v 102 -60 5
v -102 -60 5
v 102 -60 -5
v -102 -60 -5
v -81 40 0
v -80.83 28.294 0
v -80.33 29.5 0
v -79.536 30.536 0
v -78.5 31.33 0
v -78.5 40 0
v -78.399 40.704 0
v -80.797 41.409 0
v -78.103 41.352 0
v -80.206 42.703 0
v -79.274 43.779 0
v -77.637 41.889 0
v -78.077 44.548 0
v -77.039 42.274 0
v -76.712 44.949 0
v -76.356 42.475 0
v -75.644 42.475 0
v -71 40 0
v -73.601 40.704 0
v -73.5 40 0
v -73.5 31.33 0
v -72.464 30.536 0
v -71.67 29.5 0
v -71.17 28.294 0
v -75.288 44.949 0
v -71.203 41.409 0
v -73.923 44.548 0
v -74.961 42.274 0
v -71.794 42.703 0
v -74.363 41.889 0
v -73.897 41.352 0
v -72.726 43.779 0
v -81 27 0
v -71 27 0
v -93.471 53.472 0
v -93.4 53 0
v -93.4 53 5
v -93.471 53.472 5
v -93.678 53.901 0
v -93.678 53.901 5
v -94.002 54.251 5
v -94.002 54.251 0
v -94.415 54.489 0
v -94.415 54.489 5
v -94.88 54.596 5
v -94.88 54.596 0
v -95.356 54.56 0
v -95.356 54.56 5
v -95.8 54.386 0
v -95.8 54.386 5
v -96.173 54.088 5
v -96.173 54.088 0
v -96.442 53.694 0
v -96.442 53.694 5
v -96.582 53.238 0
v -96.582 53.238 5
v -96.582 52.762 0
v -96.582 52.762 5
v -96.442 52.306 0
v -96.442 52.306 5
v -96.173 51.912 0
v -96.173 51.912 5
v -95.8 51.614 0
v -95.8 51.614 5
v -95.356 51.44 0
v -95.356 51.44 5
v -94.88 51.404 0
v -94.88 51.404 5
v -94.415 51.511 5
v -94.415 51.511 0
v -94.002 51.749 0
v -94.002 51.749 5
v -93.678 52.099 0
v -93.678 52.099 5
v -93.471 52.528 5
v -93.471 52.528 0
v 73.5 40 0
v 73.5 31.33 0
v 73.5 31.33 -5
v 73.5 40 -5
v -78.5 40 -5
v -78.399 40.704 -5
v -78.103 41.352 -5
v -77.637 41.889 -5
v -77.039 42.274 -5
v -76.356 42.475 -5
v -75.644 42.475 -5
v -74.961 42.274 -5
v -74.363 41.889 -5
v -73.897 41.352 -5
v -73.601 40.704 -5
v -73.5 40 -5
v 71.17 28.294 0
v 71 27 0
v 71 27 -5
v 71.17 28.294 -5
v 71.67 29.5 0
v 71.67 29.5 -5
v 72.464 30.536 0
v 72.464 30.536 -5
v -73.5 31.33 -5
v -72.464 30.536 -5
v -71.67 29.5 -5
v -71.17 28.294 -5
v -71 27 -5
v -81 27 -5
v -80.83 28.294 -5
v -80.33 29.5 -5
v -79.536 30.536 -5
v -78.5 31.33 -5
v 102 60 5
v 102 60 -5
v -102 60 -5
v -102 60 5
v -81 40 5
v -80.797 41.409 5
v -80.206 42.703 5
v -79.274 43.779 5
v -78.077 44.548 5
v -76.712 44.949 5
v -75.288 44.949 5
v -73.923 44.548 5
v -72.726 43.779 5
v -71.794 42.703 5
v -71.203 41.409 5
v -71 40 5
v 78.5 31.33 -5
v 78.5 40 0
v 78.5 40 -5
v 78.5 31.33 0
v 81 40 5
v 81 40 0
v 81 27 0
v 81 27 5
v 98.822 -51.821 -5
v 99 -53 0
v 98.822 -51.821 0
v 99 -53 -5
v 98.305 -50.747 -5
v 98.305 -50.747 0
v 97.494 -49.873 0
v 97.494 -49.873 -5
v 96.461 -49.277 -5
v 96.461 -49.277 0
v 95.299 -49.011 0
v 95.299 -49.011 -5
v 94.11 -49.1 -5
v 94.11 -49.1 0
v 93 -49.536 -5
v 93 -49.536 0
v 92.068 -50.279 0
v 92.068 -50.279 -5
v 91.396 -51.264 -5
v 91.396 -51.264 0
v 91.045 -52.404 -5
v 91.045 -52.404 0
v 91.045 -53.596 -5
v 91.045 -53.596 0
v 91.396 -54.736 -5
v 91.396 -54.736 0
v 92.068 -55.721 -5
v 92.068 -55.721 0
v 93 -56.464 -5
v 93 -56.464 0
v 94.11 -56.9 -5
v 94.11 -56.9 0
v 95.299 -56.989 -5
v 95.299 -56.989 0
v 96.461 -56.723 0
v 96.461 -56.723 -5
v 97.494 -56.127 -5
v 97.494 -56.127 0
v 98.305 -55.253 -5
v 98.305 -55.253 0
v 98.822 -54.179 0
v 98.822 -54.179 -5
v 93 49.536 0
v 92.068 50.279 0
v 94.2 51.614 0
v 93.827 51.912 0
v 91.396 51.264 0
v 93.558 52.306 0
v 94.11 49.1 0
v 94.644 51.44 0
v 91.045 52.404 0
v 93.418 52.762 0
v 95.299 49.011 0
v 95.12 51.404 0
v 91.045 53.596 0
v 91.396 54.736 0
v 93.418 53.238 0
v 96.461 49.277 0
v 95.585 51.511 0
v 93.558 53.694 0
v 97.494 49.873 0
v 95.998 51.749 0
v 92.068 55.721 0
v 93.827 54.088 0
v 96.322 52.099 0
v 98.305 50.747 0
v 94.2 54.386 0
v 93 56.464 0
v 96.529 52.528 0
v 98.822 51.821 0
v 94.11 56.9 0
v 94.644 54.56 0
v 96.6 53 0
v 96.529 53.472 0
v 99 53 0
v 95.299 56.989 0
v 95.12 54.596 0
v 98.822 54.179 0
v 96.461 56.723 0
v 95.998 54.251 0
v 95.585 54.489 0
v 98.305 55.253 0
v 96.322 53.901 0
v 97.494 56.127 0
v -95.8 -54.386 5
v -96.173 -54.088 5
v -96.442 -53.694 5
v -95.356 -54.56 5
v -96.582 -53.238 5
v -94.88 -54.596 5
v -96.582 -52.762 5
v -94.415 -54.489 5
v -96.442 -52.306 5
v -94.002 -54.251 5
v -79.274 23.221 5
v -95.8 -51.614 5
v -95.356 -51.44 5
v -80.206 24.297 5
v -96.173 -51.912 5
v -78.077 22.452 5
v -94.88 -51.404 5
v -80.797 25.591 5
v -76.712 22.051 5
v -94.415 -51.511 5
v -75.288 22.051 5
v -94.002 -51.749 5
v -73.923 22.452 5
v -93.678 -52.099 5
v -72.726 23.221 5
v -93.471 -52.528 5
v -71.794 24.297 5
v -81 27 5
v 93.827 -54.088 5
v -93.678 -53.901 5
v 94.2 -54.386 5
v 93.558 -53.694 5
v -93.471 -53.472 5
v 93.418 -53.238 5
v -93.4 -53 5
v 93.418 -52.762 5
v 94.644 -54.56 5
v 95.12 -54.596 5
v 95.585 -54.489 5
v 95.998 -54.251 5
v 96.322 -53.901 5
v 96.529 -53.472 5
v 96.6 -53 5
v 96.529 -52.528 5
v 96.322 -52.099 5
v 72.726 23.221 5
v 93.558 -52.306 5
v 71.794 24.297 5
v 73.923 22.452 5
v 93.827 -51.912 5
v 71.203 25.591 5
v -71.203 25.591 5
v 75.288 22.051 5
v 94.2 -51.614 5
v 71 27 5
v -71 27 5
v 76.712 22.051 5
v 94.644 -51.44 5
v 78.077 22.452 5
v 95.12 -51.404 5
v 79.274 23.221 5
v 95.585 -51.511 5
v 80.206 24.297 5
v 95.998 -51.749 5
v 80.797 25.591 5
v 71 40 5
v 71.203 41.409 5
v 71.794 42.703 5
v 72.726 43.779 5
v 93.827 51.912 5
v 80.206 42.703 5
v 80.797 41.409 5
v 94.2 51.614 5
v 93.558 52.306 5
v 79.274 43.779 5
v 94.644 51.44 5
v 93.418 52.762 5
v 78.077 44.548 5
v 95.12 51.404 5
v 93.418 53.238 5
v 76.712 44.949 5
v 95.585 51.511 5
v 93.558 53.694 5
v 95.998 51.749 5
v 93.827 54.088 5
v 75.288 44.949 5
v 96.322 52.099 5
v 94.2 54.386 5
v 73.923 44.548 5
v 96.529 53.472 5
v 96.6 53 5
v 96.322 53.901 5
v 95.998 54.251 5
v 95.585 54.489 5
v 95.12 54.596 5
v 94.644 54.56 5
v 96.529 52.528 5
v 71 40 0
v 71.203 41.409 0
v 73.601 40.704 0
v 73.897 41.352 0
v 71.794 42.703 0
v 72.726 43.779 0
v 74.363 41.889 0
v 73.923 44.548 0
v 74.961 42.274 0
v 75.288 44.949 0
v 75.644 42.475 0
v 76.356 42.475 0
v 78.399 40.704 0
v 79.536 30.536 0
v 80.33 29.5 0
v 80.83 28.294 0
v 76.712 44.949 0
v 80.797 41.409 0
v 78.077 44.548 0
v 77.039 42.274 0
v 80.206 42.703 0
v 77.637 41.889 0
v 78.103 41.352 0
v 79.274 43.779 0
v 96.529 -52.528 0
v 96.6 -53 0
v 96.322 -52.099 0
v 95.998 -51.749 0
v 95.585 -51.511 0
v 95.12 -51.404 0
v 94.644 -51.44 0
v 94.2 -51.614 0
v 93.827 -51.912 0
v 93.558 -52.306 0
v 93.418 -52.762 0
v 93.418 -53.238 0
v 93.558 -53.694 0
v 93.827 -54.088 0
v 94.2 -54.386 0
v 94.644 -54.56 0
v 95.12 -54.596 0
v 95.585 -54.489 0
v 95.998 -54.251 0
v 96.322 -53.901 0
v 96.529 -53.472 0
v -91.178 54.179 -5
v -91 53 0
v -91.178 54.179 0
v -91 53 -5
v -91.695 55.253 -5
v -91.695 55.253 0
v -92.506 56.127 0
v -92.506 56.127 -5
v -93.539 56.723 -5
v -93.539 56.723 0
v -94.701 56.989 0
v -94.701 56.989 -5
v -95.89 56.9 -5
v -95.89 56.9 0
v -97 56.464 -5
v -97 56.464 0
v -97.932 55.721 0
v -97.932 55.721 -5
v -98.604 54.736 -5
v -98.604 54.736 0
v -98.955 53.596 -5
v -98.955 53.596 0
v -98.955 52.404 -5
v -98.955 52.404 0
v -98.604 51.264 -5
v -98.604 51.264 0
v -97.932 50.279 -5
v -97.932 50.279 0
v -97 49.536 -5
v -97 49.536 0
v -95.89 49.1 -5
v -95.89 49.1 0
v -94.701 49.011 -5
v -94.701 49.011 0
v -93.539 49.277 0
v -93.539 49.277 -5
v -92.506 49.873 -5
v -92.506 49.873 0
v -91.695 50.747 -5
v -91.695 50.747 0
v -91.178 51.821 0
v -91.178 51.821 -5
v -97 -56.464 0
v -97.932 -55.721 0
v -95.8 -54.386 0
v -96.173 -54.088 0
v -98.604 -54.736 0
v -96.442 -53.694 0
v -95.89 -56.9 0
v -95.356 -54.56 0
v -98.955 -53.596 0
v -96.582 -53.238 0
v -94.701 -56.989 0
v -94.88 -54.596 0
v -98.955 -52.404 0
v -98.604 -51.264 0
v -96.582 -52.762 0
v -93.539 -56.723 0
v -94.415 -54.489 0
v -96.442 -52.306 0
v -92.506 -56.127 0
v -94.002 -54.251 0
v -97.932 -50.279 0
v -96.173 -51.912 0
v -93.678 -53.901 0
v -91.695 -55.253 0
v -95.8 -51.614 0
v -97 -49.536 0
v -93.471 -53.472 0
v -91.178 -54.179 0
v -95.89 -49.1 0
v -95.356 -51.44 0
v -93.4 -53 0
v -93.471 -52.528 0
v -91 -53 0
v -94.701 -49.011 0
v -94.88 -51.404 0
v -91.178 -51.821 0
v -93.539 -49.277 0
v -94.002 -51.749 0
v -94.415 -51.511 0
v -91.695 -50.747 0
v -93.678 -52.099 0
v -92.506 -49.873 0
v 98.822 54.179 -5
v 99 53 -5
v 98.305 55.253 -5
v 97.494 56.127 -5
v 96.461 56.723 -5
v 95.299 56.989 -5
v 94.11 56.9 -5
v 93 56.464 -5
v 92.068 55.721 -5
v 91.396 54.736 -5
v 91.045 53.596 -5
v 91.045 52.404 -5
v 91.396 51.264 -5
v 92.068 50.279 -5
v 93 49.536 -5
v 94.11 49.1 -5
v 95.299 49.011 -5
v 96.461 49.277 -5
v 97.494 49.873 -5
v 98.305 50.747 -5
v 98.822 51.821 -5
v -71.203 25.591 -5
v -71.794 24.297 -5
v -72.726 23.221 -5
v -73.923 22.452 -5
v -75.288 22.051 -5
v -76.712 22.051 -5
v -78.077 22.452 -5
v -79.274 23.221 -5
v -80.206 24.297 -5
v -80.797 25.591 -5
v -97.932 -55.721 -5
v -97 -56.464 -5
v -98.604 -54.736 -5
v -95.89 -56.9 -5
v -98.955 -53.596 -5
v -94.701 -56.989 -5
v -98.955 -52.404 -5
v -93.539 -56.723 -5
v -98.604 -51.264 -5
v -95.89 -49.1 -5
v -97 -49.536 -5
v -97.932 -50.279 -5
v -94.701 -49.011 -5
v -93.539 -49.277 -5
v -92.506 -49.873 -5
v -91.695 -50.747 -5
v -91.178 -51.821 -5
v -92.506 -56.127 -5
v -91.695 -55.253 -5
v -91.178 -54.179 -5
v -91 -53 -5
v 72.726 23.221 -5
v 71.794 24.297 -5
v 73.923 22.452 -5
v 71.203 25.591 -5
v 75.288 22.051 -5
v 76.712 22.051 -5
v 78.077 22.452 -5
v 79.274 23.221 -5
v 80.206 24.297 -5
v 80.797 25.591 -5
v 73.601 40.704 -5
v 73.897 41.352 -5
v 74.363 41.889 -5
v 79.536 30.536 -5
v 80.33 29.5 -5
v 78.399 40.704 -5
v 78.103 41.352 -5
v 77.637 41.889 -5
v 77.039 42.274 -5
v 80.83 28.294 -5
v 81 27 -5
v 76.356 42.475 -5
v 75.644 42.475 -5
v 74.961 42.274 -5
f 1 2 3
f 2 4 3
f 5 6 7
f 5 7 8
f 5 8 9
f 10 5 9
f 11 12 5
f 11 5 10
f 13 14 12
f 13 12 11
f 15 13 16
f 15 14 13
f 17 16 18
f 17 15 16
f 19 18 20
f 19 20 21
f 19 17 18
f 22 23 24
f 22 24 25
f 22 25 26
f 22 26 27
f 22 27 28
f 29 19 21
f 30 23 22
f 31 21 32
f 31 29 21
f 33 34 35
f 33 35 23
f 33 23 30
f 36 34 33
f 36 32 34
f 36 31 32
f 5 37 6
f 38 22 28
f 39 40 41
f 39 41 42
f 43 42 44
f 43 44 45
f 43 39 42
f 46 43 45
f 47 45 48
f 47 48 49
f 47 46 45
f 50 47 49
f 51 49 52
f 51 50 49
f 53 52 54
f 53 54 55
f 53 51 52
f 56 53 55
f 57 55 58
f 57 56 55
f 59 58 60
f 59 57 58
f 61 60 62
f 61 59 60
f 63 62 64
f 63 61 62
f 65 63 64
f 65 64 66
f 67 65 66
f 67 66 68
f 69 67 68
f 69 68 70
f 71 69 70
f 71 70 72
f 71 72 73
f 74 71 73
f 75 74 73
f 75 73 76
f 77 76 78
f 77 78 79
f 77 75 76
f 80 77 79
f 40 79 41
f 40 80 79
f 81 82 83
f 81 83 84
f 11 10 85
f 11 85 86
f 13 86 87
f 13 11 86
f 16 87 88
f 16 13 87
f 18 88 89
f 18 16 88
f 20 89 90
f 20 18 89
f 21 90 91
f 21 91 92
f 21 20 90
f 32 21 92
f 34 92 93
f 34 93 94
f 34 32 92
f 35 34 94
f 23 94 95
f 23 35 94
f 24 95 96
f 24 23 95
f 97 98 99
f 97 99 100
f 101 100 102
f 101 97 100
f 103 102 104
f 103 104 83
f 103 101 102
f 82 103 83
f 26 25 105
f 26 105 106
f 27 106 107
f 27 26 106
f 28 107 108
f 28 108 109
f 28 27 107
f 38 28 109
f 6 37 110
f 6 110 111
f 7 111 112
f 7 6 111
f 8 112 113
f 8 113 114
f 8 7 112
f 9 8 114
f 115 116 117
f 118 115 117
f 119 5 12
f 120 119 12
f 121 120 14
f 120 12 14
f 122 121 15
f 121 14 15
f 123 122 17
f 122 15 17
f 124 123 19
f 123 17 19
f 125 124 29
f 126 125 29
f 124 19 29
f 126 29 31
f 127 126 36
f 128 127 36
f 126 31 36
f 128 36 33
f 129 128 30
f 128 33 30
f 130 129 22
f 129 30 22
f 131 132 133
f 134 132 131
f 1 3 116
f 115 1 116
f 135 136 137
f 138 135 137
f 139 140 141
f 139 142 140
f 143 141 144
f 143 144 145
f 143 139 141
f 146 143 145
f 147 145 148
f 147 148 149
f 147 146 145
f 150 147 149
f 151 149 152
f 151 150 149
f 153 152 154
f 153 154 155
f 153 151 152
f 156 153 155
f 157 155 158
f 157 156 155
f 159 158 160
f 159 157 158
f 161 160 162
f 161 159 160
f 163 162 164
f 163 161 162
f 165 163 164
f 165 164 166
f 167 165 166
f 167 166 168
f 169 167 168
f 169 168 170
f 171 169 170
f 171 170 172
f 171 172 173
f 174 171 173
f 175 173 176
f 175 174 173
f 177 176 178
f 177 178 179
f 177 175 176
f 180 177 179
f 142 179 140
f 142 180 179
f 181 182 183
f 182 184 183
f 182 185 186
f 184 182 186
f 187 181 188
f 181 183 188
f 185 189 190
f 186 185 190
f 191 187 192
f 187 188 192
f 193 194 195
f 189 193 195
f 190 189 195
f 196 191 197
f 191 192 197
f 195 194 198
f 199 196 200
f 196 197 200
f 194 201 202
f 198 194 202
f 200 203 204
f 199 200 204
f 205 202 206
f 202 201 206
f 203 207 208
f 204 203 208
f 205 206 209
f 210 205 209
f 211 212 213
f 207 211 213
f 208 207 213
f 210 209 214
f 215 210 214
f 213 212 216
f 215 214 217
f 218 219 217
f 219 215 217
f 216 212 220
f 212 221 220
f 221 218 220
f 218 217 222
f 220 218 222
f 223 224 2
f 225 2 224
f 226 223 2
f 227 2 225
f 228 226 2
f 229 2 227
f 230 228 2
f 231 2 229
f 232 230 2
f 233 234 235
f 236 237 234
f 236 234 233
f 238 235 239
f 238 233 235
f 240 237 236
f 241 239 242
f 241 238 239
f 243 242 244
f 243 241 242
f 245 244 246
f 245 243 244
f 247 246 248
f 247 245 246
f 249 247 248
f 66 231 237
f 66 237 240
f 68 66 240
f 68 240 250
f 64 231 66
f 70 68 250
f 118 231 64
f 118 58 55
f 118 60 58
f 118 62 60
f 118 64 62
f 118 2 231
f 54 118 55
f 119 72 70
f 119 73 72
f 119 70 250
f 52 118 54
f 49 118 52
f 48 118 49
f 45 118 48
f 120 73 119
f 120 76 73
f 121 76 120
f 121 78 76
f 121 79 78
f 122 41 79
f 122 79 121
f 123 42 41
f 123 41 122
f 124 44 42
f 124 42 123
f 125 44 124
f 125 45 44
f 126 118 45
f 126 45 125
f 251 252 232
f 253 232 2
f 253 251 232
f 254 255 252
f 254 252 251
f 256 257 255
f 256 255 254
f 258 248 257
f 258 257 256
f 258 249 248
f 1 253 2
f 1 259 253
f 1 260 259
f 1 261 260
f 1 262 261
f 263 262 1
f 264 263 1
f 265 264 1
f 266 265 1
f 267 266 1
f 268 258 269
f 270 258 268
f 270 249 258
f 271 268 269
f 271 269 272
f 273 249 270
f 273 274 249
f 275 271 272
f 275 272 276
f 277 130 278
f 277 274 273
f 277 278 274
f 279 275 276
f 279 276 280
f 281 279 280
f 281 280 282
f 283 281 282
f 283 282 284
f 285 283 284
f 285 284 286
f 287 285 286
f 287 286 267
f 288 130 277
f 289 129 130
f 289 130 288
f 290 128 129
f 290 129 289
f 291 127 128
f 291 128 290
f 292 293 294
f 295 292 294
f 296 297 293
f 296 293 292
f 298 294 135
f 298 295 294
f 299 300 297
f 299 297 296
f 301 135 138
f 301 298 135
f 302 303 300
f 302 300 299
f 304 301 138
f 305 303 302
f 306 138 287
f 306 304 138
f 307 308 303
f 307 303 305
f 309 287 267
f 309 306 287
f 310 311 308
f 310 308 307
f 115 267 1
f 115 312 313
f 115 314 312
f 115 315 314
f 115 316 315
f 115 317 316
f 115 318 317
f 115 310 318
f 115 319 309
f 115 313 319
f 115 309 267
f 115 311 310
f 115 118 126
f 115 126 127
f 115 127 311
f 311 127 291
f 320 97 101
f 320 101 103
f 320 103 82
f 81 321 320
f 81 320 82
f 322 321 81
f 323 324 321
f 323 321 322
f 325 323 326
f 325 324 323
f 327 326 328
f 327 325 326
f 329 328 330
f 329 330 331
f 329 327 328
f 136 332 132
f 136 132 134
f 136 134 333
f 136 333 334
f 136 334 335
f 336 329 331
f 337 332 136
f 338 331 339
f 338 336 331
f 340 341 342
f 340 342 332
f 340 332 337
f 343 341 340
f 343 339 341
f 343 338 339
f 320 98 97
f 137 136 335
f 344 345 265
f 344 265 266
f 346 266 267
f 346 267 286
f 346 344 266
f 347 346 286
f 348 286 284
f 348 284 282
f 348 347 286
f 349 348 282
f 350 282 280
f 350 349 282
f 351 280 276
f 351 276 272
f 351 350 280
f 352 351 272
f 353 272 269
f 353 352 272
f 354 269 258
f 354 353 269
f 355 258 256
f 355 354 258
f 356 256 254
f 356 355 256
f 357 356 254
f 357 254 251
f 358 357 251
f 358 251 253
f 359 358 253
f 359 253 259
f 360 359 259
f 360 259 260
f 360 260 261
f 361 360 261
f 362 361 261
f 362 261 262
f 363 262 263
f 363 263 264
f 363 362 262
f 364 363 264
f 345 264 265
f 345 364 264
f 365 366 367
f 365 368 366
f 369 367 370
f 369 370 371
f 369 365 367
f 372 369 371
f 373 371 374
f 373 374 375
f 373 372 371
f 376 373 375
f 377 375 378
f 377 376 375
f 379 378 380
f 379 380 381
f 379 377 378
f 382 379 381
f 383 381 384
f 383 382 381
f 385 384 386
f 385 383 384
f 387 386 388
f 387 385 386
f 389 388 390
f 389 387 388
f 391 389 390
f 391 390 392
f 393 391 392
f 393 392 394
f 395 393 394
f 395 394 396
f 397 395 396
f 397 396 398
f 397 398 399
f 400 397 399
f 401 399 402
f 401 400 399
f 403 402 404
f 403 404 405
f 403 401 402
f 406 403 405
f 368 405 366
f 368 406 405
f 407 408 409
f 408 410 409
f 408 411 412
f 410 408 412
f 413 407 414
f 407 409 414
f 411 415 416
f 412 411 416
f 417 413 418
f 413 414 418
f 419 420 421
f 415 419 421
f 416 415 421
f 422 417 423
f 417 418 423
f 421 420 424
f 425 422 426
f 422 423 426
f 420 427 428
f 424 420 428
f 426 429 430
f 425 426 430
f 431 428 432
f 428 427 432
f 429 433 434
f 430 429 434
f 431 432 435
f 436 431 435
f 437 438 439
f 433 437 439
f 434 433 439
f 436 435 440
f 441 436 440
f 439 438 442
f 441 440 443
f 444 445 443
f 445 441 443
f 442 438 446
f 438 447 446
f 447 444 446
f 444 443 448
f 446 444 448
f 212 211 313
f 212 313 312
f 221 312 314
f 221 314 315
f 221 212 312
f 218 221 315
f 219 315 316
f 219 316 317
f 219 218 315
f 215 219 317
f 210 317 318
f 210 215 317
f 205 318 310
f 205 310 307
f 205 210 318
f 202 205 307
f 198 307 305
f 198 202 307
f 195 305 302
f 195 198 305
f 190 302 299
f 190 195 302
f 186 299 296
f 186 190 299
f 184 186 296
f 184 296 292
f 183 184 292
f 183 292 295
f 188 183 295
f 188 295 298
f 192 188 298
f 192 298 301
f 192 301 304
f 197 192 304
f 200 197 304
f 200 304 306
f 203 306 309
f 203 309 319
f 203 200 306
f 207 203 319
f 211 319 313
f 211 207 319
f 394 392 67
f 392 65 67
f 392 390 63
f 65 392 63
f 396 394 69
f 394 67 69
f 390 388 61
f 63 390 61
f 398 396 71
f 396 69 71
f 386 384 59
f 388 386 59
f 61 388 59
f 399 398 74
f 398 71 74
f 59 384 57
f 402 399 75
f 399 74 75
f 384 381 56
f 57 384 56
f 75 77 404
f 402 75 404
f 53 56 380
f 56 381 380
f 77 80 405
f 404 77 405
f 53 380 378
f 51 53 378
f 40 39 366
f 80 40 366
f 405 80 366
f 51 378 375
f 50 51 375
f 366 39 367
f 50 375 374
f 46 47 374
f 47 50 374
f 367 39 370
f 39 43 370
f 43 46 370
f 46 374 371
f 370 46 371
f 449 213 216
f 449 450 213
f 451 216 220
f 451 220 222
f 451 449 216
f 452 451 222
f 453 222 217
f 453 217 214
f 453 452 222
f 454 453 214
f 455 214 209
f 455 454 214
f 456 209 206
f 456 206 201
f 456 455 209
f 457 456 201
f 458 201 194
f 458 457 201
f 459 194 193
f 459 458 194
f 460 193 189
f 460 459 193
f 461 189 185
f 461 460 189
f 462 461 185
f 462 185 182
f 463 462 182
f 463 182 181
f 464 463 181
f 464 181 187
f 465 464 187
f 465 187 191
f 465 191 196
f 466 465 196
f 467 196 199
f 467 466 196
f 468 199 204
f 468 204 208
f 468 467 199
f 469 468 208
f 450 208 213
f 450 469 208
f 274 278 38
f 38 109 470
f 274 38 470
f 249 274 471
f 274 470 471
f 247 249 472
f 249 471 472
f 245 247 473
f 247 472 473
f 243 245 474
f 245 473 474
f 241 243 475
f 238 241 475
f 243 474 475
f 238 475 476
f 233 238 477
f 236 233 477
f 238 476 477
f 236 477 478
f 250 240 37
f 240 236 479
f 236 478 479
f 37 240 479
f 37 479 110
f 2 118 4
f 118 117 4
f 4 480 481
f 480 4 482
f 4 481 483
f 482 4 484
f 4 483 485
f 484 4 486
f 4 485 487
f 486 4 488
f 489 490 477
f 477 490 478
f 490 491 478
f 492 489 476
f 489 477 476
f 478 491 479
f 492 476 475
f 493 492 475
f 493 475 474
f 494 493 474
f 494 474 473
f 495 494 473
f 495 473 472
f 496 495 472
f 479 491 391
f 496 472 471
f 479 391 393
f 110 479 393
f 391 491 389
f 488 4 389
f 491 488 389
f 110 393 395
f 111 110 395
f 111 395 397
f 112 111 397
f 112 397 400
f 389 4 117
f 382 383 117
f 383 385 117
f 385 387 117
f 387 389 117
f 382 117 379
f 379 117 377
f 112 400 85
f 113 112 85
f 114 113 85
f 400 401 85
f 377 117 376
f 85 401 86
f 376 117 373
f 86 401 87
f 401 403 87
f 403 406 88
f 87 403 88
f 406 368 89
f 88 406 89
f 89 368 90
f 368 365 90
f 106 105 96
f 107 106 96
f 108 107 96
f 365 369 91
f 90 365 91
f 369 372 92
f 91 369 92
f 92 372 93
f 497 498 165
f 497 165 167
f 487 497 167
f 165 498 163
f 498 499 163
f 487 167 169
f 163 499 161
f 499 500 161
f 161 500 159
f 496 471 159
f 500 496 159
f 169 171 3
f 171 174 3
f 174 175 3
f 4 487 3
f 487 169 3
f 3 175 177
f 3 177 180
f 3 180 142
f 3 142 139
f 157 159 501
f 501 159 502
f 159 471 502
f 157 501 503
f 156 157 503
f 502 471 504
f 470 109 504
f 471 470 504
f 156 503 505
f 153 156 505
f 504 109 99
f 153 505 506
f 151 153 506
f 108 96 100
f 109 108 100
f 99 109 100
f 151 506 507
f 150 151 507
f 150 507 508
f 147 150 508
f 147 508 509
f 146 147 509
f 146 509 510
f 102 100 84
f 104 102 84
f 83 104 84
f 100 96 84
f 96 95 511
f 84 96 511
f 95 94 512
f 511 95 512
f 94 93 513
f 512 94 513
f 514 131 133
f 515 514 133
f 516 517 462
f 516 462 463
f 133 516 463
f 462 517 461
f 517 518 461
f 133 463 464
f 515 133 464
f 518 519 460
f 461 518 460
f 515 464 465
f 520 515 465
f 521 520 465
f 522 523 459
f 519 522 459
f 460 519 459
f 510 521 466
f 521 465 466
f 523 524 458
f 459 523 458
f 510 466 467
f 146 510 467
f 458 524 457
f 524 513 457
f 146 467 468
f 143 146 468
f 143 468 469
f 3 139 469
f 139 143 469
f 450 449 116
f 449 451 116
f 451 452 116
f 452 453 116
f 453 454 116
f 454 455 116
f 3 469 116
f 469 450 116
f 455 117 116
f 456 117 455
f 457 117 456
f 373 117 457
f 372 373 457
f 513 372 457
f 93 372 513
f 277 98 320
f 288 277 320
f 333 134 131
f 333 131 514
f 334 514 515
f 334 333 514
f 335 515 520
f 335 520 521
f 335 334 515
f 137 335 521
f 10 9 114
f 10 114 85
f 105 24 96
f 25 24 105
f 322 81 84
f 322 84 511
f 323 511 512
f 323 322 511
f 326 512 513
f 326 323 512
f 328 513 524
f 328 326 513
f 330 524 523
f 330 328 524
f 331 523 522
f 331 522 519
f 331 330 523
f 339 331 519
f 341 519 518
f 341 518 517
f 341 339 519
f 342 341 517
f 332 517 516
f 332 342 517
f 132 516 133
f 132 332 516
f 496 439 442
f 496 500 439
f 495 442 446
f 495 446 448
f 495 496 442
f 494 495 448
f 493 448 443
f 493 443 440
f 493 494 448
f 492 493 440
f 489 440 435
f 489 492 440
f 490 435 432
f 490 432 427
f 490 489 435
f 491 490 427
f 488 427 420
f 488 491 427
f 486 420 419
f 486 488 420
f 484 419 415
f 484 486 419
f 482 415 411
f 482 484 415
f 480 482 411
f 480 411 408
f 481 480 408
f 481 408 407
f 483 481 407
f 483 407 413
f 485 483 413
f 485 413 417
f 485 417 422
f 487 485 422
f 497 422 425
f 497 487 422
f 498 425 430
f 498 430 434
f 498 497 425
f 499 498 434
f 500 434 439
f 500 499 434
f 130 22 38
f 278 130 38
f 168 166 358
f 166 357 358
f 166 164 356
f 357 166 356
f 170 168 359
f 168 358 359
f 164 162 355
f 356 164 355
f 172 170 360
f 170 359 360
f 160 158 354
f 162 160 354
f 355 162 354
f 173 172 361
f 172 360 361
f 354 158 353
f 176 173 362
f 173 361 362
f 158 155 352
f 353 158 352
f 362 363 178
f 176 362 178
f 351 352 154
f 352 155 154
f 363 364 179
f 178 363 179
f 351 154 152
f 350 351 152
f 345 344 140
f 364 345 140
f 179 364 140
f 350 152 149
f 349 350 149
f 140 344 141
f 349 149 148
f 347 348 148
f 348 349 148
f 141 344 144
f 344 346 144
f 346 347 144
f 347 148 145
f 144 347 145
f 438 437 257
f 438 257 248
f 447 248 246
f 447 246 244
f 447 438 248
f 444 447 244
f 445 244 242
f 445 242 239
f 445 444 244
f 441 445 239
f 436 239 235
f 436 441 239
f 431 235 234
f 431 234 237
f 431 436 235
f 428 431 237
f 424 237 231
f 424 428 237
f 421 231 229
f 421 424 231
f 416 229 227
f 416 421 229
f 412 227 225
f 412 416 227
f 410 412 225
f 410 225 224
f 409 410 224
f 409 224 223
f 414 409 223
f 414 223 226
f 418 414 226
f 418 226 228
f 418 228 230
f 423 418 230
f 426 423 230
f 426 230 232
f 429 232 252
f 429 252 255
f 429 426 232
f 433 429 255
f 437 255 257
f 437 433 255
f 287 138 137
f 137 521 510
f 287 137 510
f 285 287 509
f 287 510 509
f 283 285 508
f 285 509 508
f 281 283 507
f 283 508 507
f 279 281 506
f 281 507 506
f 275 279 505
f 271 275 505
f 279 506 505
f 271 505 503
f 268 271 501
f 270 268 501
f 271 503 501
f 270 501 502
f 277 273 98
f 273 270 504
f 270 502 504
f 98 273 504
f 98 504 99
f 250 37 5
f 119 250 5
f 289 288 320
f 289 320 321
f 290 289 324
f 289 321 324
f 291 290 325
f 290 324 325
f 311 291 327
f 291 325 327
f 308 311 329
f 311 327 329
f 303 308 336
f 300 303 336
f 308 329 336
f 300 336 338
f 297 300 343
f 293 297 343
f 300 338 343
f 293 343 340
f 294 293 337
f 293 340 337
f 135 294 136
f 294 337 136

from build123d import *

# Parameters (mm, degrees)
F0_R     = 4
F1_DEPTH = 5
F2_DEPTH = 5
F3_DEPTH = 5
F0_R_2   = 1.6
F4_DEPTH = 5
F5_DEPTH = 5
F6_DEPTH = 5
F7_DEPTH = 5
F8_DEPTH = 5


with BuildPart() as f1:
    # F0 (on Top) → F1 (new body)
    with BuildSketch(Plane.XY):
        Polygon((102, 53), (102, 60), (95, 60), (-95, 60), (-102, 60), (-102, 53), (-102, -53), (-102, -60), (-95, -60), (95, -60), (102, -60), (102, -53), align=None)
        with Locations((-95, -53)):
            Circle(F0_R, mode=Mode.SUBTRACT)
        with Locations((95, -53)):
            Circle(F0_R, mode=Mode.SUBTRACT)
        with BuildLine():
            ThreePointArc((-81, 40), (-76, 45), (-71, 40))
            Line((-71, 40), (-71, 27))
            ThreePointArc((-71, 27), (-76, 22), (-81, 27))
            Line((-81, 27), (-81, 40))
        make_face(mode=Mode.SUBTRACT)
        with Locations((-95, 53)):
            Circle(F0_R, mode=Mode.SUBTRACT)
        with BuildLine():
            Line((71, 27), (71, 40))
            ThreePointArc((71, 40), (76, 45), (81, 40))
            Line((81, 40), (81, 27))
            ThreePointArc((81, 27), (76, 22), (71, 27))
        make_face(mode=Mode.SUBTRACT)
        with Locations((95, 53)):
            Circle(F0_R, mode=Mode.SUBTRACT)
    extrude(amount=-F1_DEPTH)

    # F0 (on Top) → F2 (join)
    with BuildSketch(Plane.XY):
        with BuildLine():
            Line((-71, 27), (-71, 40))
            ThreePointArc((-71, 40), (-76, 45), (-81, 40))
            Line((-81, 40), (-81, 27))
            ThreePointArc((-81, 27), (-80.330127, 29.5), (-78.5, 31.330127))
            Line((-78.5, 31.330127), (-78.5, 40))
            ThreePointArc((-78.5, 40), (-76, 42.5), (-73.5, 40))
            Line((-73.5, 40), (-73.5, 31.330127))
            ThreePointArc((-73.5, 31.330127), (-71.669873, 29.5), (-71, 27))
        make_face()
    extrude(amount=-F2_DEPTH)

    # F0 (on Top) → F3 (join)
    with BuildSketch(Plane.XY):
        Polygon((102, 53), (102, 60), (95, 60), (-95, 60), (-102, 60), (-102, 53), (-102, -53), (-102, -60), (-95, -60), (95, -60), (102, -60), (102, -53), align=None)
        with Locations((-95, -53)):
            Circle(F0_R, mode=Mode.SUBTRACT)
        with Locations((95, -53)):
            Circle(F0_R, mode=Mode.SUBTRACT)
        with BuildLine():
            ThreePointArc((-81, 40), (-76, 45), (-71, 40))
            Line((-71, 40), (-71, 27))
            ThreePointArc((-71, 27), (-76, 22), (-81, 27))
            Line((-81, 27), (-81, 40))
        make_face(mode=Mode.SUBTRACT)
        with Locations((-95, 53)):
            Circle(F0_R, mode=Mode.SUBTRACT)
        with BuildLine():
            Line((71, 27), (71, 40))
            ThreePointArc((71, 40), (76, 45), (81, 40))
            Line((81, 40), (81, 27))
            ThreePointArc((81, 27), (76, 22), (71, 27))
        make_face(mode=Mode.SUBTRACT)
        with Locations((95, 53)):
            Circle(F0_R, mode=Mode.SUBTRACT)
    extrude(amount=F3_DEPTH)

    # F0 (on Top) → F4 (join)
    with BuildSketch(Plane.XY):
        with Locations((95, -53)):
            Circle(F0_R)
        with Locations((95, -53)):
            Circle(F0_R_2, mode=Mode.SUBTRACT)
    extrude(amount=F4_DEPTH)

    # F0 (on Top) → F5 (join)
    with BuildSketch(Plane.XY):
        with BuildLine():
            ThreePointArc((81, 40), (76, 45), (71, 40))
            Line((71, 40), (71, 27))
            ThreePointArc((71, 27), (71.669873, 29.5), (73.5, 31.330127))
            Line((73.5, 31.330127), (73.5, 40))
            ThreePointArc((73.5, 40), (76, 42.5), (78.5, 40))
            Line((78.5, 40), (78.5, 31.330127))
            ThreePointArc((78.5, 31.330127), (80.330127, 29.5), (81, 27))
            Line((81, 27), (81, 40))
        make_face()
    extrude(amount=-F5_DEPTH)

    # F0 (on Top) → F6 (join)
    with BuildSketch(Plane.XY):
        with Locations((95, 53)):
            Circle(F0_R)
        with Locations((95, 53)):
            Circle(F0_R_2, mode=Mode.SUBTRACT)
    extrude(amount=F6_DEPTH)

    # F0 (on Top) → F7 (join)
    with BuildSketch(Plane.XY):
        with Locations((-95, 53)):
            Circle(F0_R)
        with Locations((-95, 53)):
            Circle(F0_R_2, mode=Mode.SUBTRACT)
    extrude(amount=F7_DEPTH)

    # F0 (on Top) → F8 (join)
    with BuildSketch(Plane.XY):
        with Locations((-95, -53)):
            Circle(F0_R)
        with Locations((-95, -53)):
            Circle(F0_R_2, mode=Mode.SUBTRACT)
    extrude(amount=F8_DEPTH)


solid = f1.part
